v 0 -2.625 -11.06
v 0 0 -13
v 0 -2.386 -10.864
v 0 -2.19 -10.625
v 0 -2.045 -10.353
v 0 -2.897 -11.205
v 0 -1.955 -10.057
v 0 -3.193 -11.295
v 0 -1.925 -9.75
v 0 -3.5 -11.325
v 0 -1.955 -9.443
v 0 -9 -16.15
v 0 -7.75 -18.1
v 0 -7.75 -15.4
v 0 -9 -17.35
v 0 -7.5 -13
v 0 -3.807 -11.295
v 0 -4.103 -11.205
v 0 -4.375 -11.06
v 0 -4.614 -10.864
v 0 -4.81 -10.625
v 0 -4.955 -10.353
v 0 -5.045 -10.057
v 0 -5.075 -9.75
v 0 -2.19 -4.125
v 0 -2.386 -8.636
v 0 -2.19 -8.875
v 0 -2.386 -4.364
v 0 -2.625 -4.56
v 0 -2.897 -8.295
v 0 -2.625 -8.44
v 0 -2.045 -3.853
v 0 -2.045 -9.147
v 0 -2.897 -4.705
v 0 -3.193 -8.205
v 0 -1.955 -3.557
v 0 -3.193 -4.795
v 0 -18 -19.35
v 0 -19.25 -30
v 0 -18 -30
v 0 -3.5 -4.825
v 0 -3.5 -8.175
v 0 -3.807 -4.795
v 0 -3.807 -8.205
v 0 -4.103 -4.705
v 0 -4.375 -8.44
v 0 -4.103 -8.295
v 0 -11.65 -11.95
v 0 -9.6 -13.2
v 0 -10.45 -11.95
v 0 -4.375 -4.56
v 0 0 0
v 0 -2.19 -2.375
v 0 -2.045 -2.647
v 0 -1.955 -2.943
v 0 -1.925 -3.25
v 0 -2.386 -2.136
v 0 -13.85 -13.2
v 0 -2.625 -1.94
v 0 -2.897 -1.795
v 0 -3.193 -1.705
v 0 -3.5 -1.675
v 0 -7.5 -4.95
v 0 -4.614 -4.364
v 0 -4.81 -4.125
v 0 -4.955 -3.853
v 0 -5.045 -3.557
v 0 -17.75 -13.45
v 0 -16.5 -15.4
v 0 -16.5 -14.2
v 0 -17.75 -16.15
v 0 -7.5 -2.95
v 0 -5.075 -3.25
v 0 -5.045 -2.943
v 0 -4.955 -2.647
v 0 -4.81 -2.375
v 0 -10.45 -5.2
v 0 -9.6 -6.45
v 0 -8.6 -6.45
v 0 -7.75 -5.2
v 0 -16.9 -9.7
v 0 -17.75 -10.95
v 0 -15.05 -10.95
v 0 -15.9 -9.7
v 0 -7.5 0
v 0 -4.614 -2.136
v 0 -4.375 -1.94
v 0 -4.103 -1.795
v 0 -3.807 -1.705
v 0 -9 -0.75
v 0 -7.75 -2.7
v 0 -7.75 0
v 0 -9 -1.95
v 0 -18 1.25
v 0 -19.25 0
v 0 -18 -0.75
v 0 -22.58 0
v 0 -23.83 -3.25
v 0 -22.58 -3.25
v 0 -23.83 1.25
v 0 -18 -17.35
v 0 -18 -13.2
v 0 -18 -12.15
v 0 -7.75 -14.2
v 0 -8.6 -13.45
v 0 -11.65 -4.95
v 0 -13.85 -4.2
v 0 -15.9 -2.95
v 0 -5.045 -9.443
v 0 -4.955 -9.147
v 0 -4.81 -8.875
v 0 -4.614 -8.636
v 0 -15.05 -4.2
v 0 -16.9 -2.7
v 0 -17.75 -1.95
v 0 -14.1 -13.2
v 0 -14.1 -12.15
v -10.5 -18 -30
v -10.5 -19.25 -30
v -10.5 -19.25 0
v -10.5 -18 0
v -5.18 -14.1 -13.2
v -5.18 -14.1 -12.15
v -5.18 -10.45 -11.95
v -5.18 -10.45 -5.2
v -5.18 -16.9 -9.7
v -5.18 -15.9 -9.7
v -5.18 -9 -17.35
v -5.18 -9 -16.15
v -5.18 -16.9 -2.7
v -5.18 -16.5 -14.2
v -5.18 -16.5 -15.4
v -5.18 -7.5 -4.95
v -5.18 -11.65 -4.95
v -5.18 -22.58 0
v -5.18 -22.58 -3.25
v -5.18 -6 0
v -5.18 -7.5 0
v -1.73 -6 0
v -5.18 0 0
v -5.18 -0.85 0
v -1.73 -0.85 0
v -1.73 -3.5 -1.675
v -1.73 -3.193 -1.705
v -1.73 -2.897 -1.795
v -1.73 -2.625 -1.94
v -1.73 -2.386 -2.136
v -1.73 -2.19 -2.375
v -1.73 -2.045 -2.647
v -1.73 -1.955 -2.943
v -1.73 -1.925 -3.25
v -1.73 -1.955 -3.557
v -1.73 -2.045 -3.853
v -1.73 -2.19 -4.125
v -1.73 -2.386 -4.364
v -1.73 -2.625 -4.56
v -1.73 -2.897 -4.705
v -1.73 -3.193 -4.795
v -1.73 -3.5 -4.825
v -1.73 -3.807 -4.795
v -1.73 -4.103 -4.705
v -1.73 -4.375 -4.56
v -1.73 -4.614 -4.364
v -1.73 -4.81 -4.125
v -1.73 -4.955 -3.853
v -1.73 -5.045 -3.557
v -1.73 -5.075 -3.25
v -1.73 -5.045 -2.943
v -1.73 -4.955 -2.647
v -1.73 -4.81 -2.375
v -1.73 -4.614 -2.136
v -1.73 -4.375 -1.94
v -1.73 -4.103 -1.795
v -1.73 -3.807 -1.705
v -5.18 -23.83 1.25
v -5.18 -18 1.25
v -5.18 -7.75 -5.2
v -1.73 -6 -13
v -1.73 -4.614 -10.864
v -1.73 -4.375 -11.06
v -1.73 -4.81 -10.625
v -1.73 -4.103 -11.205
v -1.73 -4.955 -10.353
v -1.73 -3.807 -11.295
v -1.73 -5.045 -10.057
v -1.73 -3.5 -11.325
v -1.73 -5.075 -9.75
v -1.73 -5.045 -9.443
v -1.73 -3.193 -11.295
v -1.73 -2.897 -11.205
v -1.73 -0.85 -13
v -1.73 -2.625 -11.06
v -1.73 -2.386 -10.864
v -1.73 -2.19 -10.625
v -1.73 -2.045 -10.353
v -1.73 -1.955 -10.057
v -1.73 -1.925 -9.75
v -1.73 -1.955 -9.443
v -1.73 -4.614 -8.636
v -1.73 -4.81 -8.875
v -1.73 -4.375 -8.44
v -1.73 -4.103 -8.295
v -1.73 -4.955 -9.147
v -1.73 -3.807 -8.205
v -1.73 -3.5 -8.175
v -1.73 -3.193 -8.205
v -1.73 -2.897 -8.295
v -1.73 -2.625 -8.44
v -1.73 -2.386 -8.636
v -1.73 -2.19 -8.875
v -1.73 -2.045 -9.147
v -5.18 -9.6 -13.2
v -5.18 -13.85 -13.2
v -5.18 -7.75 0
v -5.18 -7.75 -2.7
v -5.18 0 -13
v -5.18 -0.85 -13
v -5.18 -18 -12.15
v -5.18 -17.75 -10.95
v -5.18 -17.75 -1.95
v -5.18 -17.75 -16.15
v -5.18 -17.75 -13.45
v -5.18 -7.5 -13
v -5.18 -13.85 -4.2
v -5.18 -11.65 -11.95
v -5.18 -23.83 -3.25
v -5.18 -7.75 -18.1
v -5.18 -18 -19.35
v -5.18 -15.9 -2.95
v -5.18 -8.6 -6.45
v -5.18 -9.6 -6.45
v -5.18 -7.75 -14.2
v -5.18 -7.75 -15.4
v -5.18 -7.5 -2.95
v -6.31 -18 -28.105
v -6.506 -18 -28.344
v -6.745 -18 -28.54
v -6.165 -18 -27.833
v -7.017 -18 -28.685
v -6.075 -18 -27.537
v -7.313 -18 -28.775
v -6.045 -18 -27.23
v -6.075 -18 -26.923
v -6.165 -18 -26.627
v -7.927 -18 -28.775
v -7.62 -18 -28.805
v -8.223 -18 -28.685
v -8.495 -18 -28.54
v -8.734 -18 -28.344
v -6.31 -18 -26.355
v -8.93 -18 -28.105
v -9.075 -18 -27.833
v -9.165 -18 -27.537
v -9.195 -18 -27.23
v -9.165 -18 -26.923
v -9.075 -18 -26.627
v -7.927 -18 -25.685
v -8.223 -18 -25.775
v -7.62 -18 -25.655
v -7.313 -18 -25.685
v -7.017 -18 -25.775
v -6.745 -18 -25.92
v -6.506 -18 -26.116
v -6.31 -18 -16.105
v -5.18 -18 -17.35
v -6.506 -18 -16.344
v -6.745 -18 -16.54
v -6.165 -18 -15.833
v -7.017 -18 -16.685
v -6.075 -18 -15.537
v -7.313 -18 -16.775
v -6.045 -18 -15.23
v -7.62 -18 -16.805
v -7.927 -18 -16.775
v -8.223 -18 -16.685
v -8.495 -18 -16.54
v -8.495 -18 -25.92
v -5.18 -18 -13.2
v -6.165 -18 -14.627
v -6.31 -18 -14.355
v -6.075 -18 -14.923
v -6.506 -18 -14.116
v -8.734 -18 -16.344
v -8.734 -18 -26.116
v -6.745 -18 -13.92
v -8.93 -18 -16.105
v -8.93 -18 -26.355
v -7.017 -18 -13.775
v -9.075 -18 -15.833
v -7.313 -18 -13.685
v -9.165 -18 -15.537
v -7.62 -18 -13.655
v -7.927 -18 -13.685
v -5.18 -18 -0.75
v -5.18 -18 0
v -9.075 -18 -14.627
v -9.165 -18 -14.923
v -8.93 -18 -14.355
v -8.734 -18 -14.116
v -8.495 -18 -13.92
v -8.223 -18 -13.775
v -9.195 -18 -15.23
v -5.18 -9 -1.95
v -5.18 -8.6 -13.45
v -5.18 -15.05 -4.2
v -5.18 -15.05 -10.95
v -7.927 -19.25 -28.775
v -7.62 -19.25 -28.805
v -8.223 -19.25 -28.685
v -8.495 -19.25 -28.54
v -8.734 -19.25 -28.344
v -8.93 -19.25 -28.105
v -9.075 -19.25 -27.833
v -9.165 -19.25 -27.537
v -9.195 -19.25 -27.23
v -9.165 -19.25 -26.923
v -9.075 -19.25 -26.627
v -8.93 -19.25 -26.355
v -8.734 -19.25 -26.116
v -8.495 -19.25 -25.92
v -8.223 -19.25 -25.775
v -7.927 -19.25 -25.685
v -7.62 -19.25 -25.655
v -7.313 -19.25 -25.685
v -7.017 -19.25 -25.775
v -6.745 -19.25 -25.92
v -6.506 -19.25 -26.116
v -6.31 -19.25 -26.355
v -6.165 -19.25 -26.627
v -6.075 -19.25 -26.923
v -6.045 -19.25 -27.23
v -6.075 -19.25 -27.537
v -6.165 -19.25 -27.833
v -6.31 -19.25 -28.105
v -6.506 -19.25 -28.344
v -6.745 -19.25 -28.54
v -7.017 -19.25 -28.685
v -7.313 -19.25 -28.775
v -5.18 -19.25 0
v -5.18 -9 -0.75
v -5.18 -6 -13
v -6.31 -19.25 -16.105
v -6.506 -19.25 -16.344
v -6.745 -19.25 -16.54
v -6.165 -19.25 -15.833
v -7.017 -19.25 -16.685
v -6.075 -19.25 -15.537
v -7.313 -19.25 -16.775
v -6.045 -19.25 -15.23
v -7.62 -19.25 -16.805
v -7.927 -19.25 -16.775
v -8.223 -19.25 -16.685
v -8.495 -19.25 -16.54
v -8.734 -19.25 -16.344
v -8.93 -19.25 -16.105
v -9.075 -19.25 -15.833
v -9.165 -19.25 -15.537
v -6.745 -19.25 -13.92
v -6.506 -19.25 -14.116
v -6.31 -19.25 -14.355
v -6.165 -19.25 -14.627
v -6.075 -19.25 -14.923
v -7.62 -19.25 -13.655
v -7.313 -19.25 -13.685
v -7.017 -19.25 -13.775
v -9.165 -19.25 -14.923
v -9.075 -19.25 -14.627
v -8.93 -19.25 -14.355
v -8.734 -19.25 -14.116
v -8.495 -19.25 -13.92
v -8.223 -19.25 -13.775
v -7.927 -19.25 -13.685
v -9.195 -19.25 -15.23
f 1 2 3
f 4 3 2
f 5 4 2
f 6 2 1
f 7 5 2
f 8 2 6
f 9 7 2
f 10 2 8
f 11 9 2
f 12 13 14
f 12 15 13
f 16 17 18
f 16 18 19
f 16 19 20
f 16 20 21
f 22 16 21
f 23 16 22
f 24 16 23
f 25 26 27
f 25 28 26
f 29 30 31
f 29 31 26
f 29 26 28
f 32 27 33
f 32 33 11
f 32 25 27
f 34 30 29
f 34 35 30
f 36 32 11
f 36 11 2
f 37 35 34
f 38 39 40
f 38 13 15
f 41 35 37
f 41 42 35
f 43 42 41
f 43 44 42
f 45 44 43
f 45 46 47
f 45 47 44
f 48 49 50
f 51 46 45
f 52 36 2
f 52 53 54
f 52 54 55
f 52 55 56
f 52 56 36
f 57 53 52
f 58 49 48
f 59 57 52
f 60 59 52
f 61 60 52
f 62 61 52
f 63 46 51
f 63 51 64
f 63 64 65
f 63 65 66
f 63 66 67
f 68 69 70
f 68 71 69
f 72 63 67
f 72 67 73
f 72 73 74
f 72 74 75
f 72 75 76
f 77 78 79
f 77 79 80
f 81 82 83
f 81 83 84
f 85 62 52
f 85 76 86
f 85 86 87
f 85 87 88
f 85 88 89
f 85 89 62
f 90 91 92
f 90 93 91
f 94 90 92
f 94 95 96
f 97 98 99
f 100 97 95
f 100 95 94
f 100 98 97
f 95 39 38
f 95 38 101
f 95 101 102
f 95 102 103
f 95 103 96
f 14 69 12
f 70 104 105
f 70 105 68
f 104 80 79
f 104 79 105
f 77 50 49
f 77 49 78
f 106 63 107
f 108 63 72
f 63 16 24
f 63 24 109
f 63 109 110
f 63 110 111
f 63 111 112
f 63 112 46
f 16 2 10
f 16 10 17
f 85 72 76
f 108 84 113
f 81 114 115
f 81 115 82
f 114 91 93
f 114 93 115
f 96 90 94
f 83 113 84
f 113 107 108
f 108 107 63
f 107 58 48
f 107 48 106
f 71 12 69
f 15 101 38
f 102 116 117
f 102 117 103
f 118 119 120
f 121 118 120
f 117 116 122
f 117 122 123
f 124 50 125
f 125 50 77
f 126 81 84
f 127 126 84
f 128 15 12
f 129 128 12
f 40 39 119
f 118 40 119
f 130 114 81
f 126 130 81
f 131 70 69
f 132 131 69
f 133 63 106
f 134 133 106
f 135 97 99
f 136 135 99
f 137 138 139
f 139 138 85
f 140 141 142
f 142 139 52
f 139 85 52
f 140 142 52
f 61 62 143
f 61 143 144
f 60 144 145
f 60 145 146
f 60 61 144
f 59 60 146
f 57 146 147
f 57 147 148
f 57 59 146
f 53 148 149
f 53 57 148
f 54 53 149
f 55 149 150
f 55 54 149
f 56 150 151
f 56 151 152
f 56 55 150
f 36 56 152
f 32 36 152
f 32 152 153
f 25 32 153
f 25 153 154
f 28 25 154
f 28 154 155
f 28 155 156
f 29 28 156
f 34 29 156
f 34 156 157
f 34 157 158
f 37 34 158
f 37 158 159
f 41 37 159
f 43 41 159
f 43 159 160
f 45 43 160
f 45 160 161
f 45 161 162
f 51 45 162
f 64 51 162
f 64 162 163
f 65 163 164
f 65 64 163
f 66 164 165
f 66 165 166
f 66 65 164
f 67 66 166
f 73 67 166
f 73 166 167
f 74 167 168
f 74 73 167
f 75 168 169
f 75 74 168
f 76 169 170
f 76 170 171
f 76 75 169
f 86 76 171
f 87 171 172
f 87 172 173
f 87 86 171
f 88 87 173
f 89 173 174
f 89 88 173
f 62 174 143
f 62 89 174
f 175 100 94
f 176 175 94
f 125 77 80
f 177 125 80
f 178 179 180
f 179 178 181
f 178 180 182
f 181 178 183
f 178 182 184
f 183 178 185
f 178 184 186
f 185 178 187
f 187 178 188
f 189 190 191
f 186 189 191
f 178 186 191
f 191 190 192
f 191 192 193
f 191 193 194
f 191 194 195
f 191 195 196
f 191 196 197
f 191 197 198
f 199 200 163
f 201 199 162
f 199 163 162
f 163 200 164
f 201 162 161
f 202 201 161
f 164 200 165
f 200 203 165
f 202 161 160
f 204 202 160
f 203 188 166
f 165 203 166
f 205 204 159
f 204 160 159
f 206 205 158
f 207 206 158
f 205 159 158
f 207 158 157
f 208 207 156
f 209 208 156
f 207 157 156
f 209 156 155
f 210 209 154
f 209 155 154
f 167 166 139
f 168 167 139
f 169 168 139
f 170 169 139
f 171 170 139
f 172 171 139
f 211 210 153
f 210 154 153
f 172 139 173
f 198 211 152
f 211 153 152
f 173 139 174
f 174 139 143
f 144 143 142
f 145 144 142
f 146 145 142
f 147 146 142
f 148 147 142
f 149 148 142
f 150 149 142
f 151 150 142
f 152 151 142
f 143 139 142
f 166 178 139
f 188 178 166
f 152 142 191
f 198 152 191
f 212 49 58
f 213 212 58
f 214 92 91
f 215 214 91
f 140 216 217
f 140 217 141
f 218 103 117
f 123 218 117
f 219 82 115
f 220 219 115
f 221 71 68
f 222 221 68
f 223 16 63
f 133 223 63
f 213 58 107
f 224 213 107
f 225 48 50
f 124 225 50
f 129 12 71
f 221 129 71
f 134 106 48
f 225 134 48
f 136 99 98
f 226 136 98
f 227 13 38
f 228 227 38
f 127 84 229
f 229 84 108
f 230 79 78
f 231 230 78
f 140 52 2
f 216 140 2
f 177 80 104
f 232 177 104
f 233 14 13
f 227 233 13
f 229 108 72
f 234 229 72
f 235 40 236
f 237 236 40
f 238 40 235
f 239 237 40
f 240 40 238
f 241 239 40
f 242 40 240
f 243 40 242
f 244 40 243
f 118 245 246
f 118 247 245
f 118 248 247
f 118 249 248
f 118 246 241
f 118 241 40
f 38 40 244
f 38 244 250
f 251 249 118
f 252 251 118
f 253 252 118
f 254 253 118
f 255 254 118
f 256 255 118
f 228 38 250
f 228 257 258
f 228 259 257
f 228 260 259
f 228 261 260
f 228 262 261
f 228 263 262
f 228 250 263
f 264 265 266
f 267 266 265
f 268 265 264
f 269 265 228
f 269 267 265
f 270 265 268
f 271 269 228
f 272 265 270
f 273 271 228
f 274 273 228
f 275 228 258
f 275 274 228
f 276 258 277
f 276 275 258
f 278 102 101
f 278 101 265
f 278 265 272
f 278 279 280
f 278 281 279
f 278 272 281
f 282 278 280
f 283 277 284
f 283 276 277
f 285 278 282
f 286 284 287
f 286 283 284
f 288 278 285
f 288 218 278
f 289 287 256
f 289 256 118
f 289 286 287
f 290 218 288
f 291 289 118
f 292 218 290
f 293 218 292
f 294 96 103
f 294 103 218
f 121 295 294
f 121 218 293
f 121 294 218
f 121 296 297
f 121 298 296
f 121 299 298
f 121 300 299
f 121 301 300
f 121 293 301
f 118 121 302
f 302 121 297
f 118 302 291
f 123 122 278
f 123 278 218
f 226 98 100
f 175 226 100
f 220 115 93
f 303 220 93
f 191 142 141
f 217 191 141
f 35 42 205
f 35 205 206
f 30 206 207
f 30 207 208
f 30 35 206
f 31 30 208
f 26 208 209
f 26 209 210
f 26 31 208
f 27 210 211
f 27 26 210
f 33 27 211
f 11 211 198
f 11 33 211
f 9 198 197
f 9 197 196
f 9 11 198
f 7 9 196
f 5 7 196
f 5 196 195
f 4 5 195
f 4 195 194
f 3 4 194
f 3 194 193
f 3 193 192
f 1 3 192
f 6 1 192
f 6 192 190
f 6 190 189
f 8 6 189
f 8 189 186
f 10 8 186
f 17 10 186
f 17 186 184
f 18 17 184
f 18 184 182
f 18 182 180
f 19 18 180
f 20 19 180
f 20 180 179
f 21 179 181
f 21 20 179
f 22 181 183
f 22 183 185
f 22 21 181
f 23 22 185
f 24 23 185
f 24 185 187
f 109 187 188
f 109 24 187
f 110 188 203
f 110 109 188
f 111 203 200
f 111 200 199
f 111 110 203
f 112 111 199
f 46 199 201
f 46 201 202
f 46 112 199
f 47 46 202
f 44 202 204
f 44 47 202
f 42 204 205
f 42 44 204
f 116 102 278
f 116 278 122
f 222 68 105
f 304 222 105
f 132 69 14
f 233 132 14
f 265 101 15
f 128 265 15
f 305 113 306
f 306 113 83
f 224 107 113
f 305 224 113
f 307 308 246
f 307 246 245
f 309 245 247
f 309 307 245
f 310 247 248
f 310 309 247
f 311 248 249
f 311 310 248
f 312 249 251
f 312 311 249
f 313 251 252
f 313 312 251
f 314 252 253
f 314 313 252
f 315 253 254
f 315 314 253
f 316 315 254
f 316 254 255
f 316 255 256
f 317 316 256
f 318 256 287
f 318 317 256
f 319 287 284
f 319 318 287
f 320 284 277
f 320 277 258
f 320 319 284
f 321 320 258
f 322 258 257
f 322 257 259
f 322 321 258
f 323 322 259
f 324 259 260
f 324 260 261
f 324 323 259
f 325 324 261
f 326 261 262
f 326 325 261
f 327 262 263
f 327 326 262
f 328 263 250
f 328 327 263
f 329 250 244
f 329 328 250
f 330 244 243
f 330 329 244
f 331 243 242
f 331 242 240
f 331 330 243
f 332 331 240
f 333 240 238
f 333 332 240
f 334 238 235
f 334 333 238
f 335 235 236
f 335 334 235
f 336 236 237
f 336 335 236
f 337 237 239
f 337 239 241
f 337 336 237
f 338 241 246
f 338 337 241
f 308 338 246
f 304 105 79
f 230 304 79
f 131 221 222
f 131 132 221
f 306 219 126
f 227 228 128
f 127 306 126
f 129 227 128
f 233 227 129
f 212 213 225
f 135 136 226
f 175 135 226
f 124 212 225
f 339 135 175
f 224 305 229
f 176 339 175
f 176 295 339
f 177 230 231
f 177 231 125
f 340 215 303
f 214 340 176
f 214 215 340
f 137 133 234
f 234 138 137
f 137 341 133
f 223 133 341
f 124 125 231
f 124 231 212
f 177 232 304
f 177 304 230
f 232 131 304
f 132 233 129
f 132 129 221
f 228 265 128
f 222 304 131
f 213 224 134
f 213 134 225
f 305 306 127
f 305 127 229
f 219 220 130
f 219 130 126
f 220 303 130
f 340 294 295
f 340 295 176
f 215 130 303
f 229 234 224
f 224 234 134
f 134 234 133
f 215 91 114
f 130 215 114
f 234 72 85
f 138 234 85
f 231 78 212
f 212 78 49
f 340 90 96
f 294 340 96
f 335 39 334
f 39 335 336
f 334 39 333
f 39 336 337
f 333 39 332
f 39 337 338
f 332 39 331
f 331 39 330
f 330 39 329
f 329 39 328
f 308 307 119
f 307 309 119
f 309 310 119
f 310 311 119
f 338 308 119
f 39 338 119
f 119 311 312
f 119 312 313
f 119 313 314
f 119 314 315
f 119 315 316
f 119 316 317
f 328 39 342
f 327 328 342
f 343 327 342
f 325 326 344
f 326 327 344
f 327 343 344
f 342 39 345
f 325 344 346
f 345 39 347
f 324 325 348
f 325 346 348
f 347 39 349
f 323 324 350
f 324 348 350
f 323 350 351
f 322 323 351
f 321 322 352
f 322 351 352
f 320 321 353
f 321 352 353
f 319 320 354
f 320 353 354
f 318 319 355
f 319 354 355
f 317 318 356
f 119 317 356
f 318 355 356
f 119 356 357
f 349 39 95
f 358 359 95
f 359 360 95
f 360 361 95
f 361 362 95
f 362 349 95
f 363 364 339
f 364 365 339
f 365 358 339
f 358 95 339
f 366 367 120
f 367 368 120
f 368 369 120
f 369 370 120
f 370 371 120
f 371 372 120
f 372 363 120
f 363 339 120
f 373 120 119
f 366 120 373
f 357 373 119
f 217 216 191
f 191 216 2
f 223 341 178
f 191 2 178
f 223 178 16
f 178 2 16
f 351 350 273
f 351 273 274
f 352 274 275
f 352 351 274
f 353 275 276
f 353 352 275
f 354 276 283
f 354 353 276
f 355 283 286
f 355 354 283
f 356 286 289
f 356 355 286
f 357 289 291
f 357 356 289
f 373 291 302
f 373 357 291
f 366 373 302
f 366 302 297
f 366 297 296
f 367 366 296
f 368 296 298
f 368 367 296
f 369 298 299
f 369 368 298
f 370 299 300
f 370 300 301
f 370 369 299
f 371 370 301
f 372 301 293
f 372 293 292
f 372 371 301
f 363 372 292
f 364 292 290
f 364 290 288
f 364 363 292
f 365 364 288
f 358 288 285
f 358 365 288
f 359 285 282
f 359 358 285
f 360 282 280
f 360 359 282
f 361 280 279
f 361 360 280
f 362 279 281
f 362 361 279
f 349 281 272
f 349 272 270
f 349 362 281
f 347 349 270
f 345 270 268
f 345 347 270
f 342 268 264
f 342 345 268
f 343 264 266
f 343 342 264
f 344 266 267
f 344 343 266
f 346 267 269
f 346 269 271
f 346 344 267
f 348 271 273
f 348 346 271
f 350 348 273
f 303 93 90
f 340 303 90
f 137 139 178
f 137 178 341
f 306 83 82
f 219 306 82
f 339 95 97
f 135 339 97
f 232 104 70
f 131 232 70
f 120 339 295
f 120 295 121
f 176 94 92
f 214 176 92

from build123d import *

# Parameters (mm, degrees)
BOSS_EXTRUDE1_DEPTH = 5.18
CUT_EXTRUDE1_REACH  = 33.131
SKETCH2_W           = 3.45
SKETCH2_H           = 5.15
SKETCH3_W           = 10.5
SKETCH3_H           = 30
SKETCH3_R           = 1.575
BOSS_EXTRUDE2_DEPTH = 1.25
CUT_EXTRUDE3_REACH  = 41.726
SKETCH7_R           = 1.575
SKETCH9_W           = 1.05
SKETCH9_H           = 3.9
BOSS_EXTRUDE3_DEPTH = 5.18


with BuildPart() as part:
    # Sketch1 → Boss-Extrude1 (new body)
    with BuildSketch(Plane(origin=(0, 0, 0), x_dir=(0, 0, -1), z_dir=(1, 0, 0))):
        Polygon((0, 0), (13, 0), (13, -7.5), (4.95, -7.5), (4.95, -11.65), (11.95, -11.65), (11.95, -10.45), (5.2, -10.45), (5.2, -7.75), (14.2, -7.75), (14.2, -16.5), (15.4, -16.5), (15.4, -7.75), (18.1, -7.75), (19.35, -18), (19.35, -19.25), (0, -19.25), (0, -22.58), (3.25, -22.58), (3.25, -23.83), (-1.25, -23.83), (-1.25, -18), (0, -7.75), (2.7, -7.75), (2.7, -16.9), (9.7, -16.9), (9.7, -15.9), (2.95, -15.9), (2.95, -7.5), (0, -7.5), align=None)
        Polygon((13.2, -9.6), (13.2, -13.85), (4.2, -13.85), (4.2, -15.05), (10.95, -15.05), (10.95, -17.75), (1.95, -17.75), (1.95, -9), (0.75, -9), (0.75, -18), (17.35, -18), (17.35, -9), (16.15, -9), (16.15, -17.75), (13.45, -17.75), (13.45, -8.6), (6.45, -8.6), (6.45, -9.6), align=None, mode=Mode.SUBTRACT)
    extrude(amount=BOSS_EXTRUDE1_DEPTH)

    # Sketch2 → Cut-Extrude1 (cut, up to next)
    with BuildSketch(Plane.XY, mode=Mode.PRIVATE) as cut_extrude1_sk1:
        with Locations((3.455, -3.425)):
            Rectangle(SKETCH2_W, SKETCH2_H)
    cut_extrude1_tool1 = extrude(cut_extrude1_sk1.sketch, amount=-CUT_EXTRUDE1_REACH, mode=Mode.PRIVATE) & part.part
    add(cut_extrude1_tool1.solids().sort_by_distance((3.455, -3.425, 0))[0], mode=Mode.SUBTRACT)

    # Sketch3 → Boss-Extrude2 (add)
    with BuildSketch(Plane.XZ.offset(19.25)):
        with Locations((5.25, -15)):
            Rectangle(SKETCH3_W, SKETCH3_H)
        with Locations(Location((7.62, -15.23, 0), (0, 0, 270))):
            Circle(SKETCH3_R, mode=Mode.SUBTRACT)
        with Locations(Location((7.62, -27.23, 0), (0, 0, 270))):
            Circle(SKETCH3_R, mode=Mode.SUBTRACT)
    extrude(amount=-BOSS_EXTRUDE2_DEPTH)

    # Sketch7 → Cut-Extrude3 (cut, up to next)
    with BuildSketch(Plane.ZY, mode=Mode.PRIVATE) as cut_extrude3_sk1:
        with Locations((-3.25, -3.5)):
            Circle(SKETCH7_R)
    cut_extrude3_tool1 = extrude(cut_extrude3_sk1.sketch, amount=-CUT_EXTRUDE3_REACH, mode=Mode.PRIVATE) & part.part
    # Sketch7 → Cut-Extrude3 (cut, up to next)
    with BuildSketch(Plane.ZY, mode=Mode.PRIVATE) as cut_extrude3_sk2:
        with Locations((-9.75, -3.5)):
            Circle(SKETCH7_R)
    cut_extrude3_tool2 = extrude(cut_extrude3_sk2.sketch, amount=-CUT_EXTRUDE3_REACH, mode=Mode.PRIVATE) & part.part
    add(cut_extrude3_tool1.solids().sort_by_distance((0, -3.5, -3.25))[0], mode=Mode.SUBTRACT)
    add(cut_extrude3_tool2.solids().sort_by_distance((0, -3.5, -9.75))[0], mode=Mode.SUBTRACT)

    # Sketch9 → Boss-Extrude3 (add)
    with BuildSketch(Plane.ZY):
        with Locations((-12.675, -16.05)):
            Rectangle(SKETCH9_W, SKETCH9_H)
    extrude(amount=-BOSS_EXTRUDE3_DEPTH)


with BuildPart() as body_2:
    # Mirror3: mirrored copy
    add(part.part.mirror(Plane(origin=(0, 0, 0), x_dir=(0, 0, 1), z_dir=(1, 0, 0))))


solid = body_2.part
